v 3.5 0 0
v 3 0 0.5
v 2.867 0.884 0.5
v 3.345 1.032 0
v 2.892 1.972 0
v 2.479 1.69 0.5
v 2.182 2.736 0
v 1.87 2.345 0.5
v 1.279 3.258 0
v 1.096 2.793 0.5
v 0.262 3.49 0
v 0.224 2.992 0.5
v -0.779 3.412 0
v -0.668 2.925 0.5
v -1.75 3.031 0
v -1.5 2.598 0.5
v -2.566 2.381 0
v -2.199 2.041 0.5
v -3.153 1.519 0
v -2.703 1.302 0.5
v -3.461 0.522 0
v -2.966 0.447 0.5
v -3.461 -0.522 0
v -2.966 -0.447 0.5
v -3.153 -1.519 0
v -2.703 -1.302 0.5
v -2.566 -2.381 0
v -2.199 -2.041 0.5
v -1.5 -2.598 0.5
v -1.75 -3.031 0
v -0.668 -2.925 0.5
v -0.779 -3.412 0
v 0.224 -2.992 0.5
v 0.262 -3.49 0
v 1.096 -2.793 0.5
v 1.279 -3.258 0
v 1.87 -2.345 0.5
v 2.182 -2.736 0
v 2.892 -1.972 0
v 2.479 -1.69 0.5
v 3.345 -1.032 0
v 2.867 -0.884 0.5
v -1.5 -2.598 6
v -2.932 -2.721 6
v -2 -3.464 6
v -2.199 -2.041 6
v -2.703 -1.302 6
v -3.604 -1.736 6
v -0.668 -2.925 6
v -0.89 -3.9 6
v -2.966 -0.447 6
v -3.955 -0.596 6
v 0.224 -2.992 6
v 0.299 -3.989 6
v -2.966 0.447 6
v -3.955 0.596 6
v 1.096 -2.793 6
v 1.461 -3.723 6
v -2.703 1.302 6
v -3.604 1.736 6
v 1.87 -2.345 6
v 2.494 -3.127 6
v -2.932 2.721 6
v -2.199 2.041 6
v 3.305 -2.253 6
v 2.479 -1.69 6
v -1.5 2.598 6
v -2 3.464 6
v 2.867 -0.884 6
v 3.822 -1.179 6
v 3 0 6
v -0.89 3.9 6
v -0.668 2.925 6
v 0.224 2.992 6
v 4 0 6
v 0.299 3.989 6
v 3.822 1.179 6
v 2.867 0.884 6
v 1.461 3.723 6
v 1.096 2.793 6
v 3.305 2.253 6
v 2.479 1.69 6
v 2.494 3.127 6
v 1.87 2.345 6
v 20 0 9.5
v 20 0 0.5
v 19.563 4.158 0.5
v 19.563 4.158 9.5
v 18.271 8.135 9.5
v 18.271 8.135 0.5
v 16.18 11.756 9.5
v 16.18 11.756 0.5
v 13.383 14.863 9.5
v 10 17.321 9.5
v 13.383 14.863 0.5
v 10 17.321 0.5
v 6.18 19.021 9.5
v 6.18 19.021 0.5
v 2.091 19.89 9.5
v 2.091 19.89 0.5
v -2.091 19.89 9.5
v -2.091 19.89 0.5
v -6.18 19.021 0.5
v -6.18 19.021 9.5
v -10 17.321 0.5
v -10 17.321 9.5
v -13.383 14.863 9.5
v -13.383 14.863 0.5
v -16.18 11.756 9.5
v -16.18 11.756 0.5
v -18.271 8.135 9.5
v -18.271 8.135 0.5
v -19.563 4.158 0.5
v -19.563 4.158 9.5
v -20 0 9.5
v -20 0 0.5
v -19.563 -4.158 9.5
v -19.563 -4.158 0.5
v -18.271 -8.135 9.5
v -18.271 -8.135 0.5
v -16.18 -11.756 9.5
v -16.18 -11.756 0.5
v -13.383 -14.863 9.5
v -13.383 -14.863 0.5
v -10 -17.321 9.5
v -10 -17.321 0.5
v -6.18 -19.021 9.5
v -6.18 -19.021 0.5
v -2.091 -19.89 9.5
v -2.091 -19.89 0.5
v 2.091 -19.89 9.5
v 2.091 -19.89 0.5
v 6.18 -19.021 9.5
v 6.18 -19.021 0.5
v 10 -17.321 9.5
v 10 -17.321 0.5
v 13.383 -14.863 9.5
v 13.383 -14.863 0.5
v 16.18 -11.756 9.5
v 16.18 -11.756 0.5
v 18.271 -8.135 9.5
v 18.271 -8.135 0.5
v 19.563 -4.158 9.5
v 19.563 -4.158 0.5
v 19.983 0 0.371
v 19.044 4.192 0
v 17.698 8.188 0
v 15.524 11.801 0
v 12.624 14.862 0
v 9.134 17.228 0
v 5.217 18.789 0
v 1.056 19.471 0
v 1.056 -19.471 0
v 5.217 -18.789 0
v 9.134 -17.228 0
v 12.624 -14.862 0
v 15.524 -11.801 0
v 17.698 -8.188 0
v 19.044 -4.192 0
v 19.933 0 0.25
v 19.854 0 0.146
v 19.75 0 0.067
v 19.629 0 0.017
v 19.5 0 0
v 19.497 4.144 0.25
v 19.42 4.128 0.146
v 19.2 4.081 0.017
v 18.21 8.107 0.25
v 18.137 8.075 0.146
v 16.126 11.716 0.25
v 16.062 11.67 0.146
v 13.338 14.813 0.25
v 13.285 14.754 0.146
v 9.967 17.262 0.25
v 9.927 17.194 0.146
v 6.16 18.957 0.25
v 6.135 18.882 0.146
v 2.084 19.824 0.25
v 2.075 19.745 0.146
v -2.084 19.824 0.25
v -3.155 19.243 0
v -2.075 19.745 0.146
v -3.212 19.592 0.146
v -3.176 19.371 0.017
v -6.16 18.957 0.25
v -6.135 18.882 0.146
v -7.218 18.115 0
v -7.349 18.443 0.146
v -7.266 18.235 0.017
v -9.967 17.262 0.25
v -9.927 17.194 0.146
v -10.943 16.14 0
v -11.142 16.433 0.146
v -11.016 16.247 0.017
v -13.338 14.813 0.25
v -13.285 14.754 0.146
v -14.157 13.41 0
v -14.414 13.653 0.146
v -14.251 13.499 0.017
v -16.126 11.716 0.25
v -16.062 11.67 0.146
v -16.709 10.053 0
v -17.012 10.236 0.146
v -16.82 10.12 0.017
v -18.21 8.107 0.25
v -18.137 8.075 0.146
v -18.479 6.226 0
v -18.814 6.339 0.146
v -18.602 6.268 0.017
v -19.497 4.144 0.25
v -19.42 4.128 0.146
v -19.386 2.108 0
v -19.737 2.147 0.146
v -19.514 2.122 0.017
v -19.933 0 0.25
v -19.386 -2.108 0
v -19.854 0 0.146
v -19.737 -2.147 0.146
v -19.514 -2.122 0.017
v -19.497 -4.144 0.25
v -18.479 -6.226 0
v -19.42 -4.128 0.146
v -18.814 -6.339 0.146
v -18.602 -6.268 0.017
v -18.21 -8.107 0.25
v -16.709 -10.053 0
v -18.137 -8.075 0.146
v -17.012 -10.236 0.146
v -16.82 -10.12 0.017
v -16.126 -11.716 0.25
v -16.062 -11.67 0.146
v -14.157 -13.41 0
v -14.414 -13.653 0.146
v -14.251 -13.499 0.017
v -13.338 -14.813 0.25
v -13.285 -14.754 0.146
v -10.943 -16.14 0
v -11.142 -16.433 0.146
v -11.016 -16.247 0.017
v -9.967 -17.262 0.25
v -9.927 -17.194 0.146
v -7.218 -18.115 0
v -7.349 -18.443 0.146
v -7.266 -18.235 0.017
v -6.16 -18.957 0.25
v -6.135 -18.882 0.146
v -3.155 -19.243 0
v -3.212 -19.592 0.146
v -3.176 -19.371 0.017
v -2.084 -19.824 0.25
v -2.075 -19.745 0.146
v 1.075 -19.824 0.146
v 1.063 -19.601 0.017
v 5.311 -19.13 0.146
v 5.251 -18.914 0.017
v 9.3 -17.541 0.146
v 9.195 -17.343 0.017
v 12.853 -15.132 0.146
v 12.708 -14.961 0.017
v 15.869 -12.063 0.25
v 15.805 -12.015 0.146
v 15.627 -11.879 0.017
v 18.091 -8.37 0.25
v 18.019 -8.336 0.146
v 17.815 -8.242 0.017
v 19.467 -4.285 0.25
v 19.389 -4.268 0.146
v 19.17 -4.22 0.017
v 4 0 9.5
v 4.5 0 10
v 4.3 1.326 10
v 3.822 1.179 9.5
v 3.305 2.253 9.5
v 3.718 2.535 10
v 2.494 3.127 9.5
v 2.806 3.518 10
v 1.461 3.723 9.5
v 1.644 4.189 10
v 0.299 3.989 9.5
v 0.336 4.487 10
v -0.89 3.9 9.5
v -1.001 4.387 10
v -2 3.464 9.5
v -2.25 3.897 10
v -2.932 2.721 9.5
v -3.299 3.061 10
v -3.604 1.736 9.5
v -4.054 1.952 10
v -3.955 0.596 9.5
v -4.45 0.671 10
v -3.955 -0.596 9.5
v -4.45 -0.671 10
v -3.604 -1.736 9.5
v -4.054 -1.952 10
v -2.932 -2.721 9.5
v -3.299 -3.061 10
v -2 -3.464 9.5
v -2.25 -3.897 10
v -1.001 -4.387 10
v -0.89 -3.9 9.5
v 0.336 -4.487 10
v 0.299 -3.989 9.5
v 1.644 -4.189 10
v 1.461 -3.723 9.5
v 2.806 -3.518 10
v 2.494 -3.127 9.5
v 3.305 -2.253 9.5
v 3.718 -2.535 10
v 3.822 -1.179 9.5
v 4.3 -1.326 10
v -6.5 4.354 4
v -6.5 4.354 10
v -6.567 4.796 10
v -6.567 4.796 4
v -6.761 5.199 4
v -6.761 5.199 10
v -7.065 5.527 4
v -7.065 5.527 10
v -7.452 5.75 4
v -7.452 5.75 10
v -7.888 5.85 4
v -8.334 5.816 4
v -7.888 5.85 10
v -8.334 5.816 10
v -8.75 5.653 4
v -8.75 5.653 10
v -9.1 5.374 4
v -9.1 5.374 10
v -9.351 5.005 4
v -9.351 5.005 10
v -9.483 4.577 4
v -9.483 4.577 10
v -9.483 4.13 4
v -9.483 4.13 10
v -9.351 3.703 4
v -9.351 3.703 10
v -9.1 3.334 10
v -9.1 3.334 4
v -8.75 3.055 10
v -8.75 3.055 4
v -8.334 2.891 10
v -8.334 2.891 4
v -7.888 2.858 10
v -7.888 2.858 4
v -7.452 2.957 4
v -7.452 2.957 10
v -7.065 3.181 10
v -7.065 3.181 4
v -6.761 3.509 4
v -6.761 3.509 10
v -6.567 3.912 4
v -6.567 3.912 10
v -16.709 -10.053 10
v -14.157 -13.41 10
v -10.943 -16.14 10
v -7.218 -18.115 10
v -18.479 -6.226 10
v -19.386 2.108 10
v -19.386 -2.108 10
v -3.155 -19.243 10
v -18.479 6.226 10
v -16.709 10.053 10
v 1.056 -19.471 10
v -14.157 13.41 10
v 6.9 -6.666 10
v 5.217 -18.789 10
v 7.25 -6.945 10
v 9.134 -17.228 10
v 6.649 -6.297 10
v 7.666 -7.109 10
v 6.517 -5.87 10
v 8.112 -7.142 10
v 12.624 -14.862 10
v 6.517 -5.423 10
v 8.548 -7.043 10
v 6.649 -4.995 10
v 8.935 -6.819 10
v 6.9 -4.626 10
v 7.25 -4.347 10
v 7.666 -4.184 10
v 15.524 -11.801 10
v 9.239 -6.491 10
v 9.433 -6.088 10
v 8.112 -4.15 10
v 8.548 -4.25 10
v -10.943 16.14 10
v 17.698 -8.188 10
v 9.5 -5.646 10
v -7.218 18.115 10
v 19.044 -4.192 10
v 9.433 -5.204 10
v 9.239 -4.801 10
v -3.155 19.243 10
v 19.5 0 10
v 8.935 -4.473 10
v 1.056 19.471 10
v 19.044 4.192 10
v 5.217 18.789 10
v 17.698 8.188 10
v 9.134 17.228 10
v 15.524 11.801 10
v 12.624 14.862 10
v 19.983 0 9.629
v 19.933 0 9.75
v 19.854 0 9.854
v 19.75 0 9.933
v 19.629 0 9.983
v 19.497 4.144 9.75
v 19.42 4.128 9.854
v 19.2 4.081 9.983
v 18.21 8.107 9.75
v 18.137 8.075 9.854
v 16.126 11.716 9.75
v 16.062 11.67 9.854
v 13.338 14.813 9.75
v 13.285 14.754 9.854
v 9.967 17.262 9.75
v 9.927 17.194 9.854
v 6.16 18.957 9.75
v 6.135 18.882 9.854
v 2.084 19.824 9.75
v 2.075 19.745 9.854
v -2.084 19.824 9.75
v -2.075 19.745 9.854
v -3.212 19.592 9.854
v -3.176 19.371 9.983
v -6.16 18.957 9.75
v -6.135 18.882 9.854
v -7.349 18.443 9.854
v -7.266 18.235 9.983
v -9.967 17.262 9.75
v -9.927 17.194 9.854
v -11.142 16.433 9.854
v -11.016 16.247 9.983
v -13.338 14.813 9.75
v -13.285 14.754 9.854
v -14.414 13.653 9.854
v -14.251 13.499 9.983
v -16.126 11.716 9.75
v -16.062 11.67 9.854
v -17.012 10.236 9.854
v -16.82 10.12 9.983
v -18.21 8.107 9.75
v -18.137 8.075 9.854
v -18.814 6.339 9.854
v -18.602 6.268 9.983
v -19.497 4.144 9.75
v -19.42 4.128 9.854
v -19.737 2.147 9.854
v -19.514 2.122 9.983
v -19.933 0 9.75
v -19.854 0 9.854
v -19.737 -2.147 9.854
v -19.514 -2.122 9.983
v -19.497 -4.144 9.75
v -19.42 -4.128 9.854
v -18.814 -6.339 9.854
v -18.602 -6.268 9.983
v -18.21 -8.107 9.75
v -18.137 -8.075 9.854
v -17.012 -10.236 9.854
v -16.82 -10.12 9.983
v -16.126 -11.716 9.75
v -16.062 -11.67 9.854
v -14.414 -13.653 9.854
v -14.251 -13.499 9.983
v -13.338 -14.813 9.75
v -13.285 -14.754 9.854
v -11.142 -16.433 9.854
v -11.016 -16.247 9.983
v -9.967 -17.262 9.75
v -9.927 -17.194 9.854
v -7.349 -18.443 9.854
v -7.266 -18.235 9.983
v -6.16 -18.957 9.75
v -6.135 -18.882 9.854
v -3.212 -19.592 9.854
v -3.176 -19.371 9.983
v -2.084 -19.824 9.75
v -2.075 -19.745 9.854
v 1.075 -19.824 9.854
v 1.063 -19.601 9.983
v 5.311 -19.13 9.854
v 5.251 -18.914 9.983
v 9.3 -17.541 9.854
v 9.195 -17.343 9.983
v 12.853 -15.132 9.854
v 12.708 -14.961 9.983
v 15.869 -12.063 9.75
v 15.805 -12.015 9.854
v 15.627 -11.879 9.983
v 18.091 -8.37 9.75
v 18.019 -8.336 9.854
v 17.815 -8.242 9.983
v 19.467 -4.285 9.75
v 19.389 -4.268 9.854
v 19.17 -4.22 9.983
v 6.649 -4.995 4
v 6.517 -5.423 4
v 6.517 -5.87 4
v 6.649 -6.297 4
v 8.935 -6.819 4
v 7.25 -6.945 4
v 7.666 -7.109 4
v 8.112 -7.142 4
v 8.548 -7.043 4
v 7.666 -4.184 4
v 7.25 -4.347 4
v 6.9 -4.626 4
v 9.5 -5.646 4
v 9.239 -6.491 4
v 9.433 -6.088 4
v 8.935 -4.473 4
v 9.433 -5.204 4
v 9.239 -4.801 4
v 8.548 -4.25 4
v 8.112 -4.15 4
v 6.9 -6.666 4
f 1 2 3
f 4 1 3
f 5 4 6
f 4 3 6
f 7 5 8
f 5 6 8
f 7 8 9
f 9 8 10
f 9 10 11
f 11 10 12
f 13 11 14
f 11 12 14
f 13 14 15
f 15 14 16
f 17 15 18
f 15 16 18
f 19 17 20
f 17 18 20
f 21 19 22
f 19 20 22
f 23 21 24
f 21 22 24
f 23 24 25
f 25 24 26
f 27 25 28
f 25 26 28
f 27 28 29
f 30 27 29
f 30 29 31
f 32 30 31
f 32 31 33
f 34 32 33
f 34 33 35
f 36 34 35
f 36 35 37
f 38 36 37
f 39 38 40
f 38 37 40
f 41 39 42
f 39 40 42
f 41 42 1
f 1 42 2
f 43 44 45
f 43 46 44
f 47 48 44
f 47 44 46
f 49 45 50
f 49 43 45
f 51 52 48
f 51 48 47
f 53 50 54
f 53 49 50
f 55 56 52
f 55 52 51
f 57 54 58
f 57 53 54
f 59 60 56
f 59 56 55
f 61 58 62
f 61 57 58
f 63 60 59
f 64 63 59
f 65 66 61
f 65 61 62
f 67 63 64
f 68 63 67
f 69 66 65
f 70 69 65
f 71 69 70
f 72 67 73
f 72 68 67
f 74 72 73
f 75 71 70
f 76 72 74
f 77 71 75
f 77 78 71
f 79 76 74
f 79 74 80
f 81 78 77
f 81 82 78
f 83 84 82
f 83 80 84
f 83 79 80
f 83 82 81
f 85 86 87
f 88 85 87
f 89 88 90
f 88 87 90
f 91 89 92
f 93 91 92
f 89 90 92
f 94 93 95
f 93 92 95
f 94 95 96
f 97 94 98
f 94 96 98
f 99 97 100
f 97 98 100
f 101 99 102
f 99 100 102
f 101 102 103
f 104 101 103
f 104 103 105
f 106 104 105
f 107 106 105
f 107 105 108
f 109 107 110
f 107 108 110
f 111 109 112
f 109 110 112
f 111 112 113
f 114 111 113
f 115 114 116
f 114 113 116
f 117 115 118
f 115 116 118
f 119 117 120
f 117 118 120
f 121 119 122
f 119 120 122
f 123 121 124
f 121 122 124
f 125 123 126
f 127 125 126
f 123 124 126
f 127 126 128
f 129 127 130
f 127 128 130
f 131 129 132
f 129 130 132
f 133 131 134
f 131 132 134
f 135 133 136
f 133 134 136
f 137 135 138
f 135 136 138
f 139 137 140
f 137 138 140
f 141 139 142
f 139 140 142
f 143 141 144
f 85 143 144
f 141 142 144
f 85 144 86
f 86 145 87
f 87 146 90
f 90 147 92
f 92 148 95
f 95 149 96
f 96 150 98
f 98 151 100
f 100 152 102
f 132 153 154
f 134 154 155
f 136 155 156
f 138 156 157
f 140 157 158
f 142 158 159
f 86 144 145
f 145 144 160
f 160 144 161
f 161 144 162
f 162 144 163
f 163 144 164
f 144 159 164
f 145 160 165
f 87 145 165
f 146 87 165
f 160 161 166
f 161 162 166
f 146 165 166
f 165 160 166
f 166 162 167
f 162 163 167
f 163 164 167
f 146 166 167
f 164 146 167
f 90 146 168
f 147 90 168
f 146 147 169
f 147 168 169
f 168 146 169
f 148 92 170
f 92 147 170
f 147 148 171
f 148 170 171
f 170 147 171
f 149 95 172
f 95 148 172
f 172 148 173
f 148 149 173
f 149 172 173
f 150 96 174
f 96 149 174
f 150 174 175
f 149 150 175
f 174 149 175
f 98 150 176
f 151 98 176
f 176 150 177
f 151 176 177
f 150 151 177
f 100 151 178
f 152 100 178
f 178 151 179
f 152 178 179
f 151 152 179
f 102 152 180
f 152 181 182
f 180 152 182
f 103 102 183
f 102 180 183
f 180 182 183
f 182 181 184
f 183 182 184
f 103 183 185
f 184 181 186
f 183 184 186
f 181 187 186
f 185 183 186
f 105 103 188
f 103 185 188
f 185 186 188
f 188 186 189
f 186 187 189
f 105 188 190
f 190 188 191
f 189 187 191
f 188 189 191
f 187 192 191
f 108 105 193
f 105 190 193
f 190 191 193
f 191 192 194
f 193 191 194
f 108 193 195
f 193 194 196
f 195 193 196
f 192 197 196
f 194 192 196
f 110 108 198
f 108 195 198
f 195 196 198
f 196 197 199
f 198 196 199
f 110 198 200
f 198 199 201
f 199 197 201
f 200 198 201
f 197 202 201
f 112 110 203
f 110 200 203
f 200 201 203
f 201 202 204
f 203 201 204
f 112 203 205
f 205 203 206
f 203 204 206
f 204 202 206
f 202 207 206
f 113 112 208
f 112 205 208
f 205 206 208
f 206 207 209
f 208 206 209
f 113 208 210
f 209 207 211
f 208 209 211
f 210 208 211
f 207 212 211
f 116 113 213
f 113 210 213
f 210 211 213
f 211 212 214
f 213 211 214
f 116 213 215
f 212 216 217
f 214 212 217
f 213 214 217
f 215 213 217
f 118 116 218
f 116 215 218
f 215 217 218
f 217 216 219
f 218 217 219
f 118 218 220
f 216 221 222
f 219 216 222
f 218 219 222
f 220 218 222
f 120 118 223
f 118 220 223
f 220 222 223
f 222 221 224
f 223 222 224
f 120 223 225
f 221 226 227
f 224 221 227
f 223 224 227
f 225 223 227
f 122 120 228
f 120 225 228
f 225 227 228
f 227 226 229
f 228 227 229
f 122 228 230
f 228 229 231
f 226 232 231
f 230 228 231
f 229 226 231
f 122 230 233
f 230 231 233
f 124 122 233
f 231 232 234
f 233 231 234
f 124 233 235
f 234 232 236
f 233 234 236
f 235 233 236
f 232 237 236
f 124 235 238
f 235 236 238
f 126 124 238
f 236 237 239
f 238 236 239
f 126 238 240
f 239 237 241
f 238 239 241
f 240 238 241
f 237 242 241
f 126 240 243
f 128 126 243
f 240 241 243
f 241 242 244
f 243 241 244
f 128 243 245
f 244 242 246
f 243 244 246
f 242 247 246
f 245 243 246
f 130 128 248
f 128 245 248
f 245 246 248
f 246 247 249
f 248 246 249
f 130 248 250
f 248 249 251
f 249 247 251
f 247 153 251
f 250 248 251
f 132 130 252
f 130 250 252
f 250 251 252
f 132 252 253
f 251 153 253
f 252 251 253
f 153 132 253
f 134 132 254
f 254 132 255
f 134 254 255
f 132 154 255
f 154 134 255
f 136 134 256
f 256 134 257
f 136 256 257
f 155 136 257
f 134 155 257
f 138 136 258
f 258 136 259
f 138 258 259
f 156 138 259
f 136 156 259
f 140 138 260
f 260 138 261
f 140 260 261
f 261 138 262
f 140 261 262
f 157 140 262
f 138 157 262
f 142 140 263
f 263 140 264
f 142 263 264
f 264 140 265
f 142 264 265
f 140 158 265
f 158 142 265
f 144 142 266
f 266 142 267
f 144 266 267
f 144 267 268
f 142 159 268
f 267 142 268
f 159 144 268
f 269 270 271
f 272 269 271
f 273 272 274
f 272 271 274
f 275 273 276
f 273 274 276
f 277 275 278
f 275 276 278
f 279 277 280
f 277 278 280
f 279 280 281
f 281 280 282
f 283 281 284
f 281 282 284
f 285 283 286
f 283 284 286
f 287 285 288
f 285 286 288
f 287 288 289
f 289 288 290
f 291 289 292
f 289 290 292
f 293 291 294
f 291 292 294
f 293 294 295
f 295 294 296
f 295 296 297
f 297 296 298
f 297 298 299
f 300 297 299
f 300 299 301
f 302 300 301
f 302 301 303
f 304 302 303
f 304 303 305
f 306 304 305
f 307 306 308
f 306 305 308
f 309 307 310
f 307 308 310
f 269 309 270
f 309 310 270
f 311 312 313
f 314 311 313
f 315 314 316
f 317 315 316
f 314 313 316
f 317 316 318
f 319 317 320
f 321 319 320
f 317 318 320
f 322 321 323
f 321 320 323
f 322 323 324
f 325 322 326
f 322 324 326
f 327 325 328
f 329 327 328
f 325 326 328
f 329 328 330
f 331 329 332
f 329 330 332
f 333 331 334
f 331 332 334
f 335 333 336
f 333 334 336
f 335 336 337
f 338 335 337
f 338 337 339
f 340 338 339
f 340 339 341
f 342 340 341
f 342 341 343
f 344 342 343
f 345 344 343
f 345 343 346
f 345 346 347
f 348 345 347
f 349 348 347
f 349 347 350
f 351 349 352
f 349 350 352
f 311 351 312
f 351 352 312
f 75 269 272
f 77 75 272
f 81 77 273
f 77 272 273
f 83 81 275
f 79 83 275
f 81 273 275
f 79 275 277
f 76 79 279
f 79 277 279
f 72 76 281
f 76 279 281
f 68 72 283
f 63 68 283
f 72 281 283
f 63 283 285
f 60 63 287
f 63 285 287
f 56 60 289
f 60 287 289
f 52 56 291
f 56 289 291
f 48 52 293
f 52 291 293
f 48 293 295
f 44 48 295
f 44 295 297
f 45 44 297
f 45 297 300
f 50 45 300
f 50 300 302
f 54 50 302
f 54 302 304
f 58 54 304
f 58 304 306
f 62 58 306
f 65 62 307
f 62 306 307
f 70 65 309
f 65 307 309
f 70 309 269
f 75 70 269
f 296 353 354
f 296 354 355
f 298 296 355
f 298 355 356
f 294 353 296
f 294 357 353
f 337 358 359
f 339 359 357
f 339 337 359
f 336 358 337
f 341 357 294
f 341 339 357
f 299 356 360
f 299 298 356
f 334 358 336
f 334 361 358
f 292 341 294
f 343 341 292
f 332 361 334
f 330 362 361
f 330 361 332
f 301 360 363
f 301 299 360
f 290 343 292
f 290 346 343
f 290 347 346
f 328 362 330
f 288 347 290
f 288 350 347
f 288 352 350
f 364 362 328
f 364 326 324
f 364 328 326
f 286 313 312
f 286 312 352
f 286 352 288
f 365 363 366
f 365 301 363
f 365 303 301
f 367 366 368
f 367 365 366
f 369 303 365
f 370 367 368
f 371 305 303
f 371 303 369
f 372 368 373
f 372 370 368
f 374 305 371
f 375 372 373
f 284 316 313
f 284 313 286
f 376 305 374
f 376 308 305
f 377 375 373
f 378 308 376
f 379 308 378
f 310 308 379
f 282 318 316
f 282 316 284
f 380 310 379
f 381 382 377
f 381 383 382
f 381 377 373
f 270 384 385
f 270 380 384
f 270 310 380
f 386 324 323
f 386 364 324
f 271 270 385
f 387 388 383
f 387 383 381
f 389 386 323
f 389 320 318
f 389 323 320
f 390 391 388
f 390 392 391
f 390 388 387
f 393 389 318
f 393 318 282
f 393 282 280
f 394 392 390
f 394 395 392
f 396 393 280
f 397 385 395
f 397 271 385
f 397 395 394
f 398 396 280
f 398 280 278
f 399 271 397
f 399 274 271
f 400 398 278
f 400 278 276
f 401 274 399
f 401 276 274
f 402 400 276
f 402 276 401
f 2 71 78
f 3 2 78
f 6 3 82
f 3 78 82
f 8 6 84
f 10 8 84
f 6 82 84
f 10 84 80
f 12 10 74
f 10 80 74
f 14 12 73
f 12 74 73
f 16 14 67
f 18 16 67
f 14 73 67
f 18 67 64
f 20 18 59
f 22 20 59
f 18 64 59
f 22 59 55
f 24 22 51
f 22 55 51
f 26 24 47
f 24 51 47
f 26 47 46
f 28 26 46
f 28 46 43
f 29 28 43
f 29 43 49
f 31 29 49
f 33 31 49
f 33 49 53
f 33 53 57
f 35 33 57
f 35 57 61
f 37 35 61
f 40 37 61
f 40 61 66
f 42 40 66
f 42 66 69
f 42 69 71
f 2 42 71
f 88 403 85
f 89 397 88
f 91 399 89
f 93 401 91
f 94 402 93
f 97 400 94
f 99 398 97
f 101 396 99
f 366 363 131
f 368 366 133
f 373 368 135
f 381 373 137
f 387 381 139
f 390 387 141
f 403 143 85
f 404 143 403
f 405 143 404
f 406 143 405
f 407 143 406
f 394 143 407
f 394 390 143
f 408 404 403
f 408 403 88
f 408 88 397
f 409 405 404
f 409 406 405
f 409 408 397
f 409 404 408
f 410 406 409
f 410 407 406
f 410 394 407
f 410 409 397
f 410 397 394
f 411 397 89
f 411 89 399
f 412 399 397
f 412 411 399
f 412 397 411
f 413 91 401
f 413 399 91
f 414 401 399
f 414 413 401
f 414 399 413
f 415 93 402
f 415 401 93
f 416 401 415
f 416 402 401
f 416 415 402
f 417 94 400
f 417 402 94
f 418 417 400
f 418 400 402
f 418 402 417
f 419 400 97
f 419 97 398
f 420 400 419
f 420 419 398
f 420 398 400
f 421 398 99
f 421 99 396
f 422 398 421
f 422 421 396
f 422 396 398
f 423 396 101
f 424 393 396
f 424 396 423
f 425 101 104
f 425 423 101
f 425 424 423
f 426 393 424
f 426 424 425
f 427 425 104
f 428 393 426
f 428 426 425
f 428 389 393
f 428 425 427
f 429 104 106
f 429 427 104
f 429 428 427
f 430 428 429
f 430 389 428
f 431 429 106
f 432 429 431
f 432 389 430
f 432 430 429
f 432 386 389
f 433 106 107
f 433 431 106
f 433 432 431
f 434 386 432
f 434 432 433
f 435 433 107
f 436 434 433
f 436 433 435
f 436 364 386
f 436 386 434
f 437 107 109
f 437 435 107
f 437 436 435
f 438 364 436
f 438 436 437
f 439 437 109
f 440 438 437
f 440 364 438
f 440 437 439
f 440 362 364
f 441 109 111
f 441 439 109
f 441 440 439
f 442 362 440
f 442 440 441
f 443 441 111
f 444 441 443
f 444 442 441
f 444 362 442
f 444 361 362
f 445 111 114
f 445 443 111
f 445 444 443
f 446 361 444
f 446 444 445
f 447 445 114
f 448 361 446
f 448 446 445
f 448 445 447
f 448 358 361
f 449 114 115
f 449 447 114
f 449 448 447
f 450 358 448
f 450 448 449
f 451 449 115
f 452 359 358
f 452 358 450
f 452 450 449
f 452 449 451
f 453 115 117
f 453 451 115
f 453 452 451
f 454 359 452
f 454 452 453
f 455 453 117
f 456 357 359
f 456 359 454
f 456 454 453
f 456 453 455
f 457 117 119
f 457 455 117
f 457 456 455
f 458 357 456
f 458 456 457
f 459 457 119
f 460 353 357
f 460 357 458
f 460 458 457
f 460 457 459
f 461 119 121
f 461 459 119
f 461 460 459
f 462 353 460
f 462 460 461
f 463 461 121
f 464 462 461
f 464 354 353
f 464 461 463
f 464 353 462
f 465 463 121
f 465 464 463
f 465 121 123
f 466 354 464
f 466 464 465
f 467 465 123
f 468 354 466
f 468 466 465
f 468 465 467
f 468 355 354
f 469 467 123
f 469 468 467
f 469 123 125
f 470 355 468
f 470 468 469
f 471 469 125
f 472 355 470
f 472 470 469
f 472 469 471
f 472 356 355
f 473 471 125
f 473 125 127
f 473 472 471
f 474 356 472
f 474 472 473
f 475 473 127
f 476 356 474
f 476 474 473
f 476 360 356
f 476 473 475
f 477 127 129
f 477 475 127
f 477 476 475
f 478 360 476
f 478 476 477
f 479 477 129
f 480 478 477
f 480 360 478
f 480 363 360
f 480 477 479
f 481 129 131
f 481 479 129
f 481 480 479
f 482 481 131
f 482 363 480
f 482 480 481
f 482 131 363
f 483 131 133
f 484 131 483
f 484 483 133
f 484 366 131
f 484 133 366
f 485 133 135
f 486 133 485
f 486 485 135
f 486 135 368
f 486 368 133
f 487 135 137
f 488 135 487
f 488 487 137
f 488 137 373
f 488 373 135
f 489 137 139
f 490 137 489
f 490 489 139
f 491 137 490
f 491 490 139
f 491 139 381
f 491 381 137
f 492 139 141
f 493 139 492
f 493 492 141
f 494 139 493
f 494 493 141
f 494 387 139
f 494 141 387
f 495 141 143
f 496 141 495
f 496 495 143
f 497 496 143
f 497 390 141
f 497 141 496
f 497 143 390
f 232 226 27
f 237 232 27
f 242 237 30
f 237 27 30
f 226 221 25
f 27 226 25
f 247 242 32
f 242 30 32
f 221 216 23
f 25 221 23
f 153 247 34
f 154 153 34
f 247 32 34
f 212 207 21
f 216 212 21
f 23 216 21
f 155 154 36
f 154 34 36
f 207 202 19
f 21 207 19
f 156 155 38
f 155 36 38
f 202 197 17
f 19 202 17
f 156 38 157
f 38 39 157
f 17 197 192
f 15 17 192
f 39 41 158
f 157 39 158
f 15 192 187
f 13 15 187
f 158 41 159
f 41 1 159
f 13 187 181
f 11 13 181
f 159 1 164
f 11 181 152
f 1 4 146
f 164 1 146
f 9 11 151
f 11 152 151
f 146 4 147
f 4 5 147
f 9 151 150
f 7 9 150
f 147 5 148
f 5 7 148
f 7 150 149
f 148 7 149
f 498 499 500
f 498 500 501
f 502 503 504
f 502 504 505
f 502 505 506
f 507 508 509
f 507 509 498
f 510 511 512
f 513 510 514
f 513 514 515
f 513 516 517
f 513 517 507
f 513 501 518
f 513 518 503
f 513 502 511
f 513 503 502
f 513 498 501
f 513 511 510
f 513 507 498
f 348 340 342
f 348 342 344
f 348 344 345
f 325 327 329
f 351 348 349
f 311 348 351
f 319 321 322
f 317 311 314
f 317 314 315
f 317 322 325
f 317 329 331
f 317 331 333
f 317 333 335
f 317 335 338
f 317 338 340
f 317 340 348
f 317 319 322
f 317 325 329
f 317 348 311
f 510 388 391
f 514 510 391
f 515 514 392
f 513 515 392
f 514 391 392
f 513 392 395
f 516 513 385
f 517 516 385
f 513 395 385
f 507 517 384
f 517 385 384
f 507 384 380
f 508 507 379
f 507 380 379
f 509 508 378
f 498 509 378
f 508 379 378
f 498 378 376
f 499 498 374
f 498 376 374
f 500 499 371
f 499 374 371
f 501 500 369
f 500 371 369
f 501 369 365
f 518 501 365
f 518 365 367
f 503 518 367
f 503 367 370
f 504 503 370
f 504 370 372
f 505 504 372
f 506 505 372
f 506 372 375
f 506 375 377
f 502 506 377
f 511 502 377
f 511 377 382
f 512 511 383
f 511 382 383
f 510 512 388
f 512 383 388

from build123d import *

# Parameters (mm, degrees)
SKETCH_1_R          = 20
EXTRUDE_1_DEPTH     = 10
SKETCH_2_R          = 3
CUT_EXTRUDE_1_DEPTH = 10
SKETCH_3_R          = 4
CUT_EXTRUDE_2_DEPTH = 4
FILLET_1_R          = 0.5
CHAMFER_1_SIZE      = 0.5
CHAMFER_2_SIZE      = 0.5
SKETCH_6_R          = 1.5
CUT_EXTRUDE_7_DEPTH = 6


with BuildPart() as part:
    # 草图1 → 凸台-拉伸1 (new body)
    with BuildSketch(Plane.XY):
        Circle(SKETCH_1_R)
    extrude(amount=EXTRUDE_1_DEPTH)

    # 草图2 → 切除-拉伸1 (cut)
    with BuildSketch(Plane.XY.offset(10)):
        Circle(SKETCH_2_R)
    extrude(amount=-CUT_EXTRUDE_1_DEPTH, mode=Mode.SUBTRACT)

    # 草图3 → 切除-拉伸2 (cut)
    with BuildSketch(Plane.XY.offset(10)):
        Circle(SKETCH_3_R)
    extrude(amount=-CUT_EXTRUDE_2_DEPTH, mode=Mode.SUBTRACT)

    # 圆角1
    fillet_1_edges = [part.edges().sort_by_distance(p)[0] for p in [
        (-20, 0, 0),
        (-20, 0, 10),
    ]]
    fillet(fillet_1_edges, radius=FILLET_1_R)

    # 倒角1
    chamfer_1_edges = [part.edges().sort_by_distance(p)[0] for p in [
        (-3, 0, 0),
    ]]
    chamfer(chamfer_1_edges, length=CHAMFER_1_SIZE)

    # 倒角2
    chamfer_2_edges = [part.edges().sort_by_distance(p)[0] for p in [
        (-4, 0, 10),
    ]]
    chamfer(chamfer_2_edges, length=CHAMFER_2_SIZE)

    # 草图6 → 切除-拉伸7 (cut)
    with BuildSketch(Plane.XY.offset(10)):
        with Locations((-8, 4.353810299)):
            Circle(SKETCH_6_R)
        with Locations((8, -5.646189701)):
            Circle(SKETCH_6_R)
    extrude(amount=-CUT_EXTRUDE_7_DEPTH, mode=Mode.SUBTRACT)


solid = part.part
